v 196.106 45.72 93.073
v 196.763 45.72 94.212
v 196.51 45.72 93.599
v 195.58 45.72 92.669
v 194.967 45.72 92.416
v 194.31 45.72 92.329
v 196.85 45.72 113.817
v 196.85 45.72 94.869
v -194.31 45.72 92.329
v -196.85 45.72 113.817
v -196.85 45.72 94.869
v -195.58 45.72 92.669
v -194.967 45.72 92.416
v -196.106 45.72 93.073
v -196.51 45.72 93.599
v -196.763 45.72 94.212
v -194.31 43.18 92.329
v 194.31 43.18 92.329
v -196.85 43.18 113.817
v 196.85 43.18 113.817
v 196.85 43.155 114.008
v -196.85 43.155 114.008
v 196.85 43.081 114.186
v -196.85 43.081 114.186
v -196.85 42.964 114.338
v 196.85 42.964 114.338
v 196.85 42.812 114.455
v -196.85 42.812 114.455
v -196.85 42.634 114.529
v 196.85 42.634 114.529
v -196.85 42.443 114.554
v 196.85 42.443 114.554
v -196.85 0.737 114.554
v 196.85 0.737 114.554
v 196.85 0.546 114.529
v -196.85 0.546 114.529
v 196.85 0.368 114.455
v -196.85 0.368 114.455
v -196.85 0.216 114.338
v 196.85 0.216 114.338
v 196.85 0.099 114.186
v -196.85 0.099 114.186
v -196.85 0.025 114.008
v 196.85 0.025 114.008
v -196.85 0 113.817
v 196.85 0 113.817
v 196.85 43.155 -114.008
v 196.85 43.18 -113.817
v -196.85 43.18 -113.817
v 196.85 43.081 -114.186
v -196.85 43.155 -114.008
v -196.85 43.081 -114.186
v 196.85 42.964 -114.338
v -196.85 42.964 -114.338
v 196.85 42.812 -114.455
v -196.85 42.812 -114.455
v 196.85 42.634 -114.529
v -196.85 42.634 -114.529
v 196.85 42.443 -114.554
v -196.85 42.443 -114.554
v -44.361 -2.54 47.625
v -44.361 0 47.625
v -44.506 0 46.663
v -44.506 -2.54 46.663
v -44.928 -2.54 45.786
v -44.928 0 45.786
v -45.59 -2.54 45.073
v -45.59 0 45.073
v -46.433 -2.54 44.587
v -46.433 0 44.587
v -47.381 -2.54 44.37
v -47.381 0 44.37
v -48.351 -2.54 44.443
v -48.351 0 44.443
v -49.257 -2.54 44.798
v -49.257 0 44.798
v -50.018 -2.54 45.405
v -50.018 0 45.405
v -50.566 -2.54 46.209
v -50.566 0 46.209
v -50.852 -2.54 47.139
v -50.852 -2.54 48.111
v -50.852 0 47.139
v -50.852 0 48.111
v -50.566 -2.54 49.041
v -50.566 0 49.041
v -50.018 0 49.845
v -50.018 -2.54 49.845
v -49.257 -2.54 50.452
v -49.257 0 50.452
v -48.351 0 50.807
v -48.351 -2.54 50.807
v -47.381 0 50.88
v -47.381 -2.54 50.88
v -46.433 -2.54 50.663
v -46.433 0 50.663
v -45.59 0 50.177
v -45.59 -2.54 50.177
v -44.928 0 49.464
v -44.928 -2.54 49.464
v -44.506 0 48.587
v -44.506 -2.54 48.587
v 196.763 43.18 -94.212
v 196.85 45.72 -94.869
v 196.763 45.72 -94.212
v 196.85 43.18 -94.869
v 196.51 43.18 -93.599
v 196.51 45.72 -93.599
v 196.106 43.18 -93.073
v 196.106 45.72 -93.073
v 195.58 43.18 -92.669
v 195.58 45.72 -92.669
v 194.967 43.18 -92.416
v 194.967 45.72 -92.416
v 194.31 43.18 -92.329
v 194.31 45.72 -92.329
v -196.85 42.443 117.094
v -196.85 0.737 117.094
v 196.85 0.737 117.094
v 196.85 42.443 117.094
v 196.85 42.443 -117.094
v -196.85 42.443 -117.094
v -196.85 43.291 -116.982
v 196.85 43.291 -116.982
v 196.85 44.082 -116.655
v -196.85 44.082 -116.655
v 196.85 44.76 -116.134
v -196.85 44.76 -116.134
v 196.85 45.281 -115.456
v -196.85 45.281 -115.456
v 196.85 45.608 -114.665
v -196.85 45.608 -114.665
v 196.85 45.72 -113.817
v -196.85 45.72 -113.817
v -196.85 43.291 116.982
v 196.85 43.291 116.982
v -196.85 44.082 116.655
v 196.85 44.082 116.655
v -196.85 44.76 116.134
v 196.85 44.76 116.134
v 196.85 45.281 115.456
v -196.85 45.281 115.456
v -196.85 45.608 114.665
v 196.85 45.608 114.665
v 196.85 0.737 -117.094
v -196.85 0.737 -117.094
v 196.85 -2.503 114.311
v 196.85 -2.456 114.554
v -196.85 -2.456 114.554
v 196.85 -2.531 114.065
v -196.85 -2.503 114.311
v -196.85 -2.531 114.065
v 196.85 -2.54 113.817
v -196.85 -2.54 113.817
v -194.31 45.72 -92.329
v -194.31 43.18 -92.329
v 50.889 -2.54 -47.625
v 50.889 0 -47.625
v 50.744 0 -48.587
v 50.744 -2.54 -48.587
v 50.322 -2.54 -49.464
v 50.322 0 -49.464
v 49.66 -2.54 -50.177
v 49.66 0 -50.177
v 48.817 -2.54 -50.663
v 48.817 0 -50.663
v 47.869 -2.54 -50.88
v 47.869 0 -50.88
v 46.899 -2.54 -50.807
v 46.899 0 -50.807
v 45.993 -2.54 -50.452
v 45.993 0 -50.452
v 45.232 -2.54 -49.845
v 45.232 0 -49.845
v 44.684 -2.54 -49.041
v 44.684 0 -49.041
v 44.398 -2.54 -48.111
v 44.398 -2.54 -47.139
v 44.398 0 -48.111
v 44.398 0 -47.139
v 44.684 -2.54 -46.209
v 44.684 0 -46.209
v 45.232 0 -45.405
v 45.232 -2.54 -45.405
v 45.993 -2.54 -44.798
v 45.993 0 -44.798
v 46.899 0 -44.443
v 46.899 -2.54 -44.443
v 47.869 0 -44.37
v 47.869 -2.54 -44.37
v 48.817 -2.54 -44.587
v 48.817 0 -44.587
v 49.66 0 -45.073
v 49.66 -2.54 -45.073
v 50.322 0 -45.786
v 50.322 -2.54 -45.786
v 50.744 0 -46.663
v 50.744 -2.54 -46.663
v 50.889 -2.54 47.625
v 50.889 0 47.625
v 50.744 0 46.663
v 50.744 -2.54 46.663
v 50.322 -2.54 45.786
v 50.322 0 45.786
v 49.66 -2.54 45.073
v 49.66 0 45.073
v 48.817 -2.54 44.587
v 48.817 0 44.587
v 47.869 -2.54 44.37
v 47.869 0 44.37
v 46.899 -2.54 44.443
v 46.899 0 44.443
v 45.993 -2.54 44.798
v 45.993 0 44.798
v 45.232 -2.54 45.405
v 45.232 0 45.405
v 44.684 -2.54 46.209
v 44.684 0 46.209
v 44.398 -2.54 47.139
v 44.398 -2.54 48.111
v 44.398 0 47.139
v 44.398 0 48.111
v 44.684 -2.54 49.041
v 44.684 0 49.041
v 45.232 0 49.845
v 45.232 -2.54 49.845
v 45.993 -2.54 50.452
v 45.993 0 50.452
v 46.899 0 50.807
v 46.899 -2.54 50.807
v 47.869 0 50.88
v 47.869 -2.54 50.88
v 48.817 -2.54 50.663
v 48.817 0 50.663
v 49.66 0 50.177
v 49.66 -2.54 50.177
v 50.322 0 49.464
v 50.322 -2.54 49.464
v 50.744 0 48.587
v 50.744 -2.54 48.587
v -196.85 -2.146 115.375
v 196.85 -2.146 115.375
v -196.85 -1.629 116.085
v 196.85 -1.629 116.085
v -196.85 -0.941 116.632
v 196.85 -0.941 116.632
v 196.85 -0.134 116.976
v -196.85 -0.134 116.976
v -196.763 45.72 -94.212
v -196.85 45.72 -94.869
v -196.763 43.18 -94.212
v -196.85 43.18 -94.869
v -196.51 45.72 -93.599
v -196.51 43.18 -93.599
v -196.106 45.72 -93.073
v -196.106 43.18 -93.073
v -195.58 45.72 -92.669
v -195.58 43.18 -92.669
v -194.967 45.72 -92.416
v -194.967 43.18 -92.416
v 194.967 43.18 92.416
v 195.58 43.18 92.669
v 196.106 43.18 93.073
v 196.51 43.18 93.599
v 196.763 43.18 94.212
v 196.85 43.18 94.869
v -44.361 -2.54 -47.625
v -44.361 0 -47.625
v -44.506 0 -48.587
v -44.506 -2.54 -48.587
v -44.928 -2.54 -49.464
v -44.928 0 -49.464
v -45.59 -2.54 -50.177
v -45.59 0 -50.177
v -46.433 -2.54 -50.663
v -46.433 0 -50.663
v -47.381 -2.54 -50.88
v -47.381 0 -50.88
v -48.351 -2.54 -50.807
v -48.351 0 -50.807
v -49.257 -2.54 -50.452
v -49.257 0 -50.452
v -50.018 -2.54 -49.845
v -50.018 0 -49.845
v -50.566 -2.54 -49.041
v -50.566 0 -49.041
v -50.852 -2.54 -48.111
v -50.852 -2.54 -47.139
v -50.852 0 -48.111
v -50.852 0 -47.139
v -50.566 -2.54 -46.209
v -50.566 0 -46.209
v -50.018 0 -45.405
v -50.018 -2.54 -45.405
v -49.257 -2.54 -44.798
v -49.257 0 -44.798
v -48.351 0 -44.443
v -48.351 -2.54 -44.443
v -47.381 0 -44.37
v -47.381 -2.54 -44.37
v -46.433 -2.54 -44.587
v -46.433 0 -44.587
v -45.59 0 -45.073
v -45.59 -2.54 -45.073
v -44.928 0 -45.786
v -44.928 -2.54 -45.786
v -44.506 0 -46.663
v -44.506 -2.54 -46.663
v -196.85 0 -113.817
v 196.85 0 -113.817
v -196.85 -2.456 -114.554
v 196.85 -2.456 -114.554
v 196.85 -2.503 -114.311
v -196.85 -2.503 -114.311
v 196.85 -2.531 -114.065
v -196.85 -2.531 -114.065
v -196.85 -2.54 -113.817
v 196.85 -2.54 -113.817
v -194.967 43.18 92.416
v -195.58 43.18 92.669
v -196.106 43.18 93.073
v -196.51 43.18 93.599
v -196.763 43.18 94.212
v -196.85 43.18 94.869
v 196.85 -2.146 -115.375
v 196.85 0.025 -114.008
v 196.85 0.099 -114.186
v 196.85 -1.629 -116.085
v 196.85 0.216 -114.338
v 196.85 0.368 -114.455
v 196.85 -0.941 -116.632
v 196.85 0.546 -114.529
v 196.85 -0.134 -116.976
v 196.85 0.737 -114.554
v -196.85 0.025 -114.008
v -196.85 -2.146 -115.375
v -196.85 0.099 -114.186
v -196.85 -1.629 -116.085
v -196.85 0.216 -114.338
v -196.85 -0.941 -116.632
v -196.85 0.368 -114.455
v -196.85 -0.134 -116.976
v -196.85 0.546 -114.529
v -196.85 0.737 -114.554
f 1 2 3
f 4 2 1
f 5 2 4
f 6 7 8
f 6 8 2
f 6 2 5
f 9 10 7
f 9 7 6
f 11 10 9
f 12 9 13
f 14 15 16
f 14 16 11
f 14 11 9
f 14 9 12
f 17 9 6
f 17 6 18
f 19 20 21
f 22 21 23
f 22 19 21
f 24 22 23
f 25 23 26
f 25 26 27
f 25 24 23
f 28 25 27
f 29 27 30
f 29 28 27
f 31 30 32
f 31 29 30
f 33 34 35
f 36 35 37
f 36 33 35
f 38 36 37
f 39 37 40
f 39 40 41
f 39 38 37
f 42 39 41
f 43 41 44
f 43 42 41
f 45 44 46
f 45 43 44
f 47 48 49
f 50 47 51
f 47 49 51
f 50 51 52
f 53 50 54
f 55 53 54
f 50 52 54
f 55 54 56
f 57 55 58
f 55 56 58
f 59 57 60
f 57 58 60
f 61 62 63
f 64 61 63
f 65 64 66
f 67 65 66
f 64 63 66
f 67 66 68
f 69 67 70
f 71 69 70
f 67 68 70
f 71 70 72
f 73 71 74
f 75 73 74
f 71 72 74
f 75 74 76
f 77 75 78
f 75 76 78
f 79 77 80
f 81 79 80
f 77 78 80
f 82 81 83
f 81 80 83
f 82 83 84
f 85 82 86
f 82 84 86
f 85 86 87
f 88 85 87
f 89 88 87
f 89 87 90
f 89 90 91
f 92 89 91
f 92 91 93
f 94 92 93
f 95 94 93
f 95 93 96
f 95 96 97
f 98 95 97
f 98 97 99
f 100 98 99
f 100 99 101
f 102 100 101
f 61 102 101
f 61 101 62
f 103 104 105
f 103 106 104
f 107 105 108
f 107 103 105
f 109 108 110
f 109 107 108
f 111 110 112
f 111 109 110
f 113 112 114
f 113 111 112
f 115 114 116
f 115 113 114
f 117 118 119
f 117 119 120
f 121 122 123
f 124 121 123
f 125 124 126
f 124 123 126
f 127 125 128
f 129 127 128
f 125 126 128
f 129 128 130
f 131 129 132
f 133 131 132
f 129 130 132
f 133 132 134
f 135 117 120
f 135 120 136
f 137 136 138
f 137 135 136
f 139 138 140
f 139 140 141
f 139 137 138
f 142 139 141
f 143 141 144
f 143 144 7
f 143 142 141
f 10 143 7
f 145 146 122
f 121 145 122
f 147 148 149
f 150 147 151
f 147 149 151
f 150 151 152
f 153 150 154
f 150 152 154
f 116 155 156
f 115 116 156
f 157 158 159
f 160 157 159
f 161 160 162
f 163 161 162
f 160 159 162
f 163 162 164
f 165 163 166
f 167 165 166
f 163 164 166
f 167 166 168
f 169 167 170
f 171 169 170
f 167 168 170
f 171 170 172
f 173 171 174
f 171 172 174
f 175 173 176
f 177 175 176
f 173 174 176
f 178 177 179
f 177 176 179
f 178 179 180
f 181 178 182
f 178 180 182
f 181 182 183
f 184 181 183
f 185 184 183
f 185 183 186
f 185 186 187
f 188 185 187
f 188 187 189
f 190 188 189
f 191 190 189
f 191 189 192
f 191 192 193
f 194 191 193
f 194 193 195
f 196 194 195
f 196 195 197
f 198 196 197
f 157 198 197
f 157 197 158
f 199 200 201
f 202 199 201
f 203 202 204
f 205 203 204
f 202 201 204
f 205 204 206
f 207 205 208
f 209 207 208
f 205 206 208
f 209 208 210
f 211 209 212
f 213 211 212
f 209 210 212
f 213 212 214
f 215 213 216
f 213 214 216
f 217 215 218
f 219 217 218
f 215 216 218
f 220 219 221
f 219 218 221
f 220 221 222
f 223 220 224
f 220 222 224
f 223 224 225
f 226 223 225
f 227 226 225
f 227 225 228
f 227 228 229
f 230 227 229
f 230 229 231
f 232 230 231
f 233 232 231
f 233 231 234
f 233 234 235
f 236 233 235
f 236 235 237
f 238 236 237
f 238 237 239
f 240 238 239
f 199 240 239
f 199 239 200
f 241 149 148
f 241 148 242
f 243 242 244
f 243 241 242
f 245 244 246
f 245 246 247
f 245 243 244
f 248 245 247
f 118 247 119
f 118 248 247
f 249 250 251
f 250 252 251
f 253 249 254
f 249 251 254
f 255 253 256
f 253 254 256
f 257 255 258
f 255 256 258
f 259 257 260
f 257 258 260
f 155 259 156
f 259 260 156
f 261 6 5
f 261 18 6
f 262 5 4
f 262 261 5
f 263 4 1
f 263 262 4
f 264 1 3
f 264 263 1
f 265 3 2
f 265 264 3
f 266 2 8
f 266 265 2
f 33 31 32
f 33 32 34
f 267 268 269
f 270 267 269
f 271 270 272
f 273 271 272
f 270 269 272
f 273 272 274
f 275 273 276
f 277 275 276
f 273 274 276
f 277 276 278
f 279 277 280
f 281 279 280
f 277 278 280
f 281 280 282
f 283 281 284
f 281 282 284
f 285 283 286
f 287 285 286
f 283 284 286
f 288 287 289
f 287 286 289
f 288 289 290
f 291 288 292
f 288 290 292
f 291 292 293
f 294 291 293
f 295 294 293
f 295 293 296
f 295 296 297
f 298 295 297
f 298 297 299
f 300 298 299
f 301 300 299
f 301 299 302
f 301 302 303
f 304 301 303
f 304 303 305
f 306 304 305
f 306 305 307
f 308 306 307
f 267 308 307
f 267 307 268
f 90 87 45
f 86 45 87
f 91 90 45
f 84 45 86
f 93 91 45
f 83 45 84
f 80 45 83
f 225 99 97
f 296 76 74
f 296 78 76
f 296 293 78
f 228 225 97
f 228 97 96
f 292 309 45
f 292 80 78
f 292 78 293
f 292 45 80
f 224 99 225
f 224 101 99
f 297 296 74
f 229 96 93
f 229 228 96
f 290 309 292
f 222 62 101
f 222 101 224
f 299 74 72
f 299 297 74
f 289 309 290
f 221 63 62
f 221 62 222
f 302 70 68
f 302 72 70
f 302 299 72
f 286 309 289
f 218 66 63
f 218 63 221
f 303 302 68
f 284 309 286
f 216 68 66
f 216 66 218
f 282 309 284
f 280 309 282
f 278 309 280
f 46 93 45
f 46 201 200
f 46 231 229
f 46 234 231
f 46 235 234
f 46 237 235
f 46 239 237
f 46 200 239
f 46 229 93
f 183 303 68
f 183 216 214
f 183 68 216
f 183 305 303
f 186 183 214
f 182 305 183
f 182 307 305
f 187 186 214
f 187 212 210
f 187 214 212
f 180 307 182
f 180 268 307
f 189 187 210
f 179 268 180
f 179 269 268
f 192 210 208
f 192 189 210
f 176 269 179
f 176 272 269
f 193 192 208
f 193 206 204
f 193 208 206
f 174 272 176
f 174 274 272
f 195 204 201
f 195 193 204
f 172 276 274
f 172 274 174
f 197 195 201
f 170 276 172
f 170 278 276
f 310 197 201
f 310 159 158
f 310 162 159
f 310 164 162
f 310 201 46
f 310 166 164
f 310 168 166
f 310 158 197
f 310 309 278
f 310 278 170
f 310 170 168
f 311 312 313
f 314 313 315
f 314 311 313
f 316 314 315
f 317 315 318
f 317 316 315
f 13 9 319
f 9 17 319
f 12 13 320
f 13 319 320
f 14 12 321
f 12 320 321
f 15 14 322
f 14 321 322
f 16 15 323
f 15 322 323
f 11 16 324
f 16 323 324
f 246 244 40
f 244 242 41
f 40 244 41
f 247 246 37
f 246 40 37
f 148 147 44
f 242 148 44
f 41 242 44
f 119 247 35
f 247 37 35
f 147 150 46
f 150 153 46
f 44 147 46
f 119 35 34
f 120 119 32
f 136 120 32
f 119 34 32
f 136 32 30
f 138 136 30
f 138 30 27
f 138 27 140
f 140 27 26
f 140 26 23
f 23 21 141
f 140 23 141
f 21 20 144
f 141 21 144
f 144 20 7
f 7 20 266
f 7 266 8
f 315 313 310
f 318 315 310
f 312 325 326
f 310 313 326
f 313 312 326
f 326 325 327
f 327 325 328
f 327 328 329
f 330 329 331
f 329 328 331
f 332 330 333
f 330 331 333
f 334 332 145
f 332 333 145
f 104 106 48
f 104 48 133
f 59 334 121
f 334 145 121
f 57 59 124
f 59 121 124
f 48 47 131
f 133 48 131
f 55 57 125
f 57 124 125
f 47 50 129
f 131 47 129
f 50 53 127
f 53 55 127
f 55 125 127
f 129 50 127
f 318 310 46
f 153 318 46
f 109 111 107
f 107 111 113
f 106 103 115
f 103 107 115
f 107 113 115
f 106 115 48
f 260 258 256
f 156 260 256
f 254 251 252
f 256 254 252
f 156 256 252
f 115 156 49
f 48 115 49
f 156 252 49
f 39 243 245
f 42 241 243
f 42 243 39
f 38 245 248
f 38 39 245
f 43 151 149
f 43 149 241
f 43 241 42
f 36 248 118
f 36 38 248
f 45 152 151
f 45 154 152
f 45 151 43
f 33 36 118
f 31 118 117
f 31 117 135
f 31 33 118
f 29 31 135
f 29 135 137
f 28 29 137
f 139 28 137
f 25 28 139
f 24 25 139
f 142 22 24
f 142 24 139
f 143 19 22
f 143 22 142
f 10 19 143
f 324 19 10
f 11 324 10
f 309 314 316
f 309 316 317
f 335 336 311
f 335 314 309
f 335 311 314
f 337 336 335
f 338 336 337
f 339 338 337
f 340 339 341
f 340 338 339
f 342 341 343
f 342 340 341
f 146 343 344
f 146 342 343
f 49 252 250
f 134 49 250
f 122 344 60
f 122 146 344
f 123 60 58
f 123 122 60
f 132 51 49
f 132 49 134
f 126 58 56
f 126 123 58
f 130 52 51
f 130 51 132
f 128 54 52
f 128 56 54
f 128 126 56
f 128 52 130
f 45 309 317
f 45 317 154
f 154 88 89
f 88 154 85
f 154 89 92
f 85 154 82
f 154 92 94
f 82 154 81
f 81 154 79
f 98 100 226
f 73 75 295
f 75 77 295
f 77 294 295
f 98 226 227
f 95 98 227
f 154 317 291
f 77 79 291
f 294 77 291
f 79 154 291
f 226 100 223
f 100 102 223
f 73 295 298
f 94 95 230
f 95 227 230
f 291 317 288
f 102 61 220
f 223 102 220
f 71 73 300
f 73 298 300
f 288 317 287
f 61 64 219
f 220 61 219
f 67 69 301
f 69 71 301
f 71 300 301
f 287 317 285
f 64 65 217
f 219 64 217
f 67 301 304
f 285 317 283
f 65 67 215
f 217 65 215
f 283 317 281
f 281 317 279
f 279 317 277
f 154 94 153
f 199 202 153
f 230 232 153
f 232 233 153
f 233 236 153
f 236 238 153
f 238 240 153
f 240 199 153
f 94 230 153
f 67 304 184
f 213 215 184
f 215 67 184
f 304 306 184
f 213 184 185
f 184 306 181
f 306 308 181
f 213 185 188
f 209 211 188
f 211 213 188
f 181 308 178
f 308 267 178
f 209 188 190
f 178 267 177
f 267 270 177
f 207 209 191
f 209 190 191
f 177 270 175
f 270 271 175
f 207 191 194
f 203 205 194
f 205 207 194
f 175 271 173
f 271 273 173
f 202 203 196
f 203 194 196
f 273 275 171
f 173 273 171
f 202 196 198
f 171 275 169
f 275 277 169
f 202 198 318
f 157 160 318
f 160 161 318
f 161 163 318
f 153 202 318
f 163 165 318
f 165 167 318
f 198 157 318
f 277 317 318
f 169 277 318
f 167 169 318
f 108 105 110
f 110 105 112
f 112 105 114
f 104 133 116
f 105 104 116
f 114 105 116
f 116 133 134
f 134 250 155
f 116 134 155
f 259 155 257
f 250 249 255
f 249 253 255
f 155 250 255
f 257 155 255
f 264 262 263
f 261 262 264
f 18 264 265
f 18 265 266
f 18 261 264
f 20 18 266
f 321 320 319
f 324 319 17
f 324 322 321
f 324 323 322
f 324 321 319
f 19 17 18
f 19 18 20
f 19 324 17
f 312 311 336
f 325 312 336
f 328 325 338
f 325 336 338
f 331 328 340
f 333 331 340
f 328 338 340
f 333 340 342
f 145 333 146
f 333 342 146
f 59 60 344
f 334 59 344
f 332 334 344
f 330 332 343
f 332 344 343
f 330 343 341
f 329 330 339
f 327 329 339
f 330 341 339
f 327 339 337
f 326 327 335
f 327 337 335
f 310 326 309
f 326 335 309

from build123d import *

# Parameters (mm, degrees)
SKETCH1_W               = 393.7
SKETCH1_H               = 229.108
BASE_FLANGE1_DEPTH      = 2.54
MITER_START             = -196.85
MITER_FLANGE1_DEPTH     = 393.7
MITER_FLANGE1_2_DEPTH   = 393.7
FILLET1_R               = 2.54
F_1_4_CLEARANCE_HOLE1_D = 6.5278


# Read off the part's stored shape, not the designer's step: Miter Flange1
# Sheet-metal steps are written as plain solids
with BuildPart() as part:
    # Sketch1 → Base-Flange1 (new body)
    with BuildSketch(Plane(origin=(0, 0, 0), x_dir=(1, 0, 0), z_dir=(0, 1, 0))):
        Rectangle(SKETCH1_W, SKETCH1_H)
    extrude(amount=-BASE_FLANGE1_DEPTH)

    # Miter Flange1 outline → Miter Flange1 (cut)
    with BuildSketch(Plane.YZ.offset(MITER_START)):
        with BuildLine():
            Line((-2.54, -114.554), (-2.456130493, -114.554))
            ThreePointArc((-2.456130493, -114.554), (-2.518965104, -114.188079664), (-2.54, -113.8174))
            Line((-2.54, -113.8174), (-2.54, -114.554))
        make_face()
    miter_flange1 = extrude(amount=MITER_FLANGE1_DEPTH, mode=Mode.SUBTRACT)

    # Miter Flange1 2 outline → Miter Flange1 2 (add)
    with BuildSketch(Plane.YZ.offset(MITER_START)):
        with BuildLine():
            Line((45.72, -113.8174), (45.72, -92.329))
            Line((45.72, -92.329), (43.18, -92.329))
            Line((43.18, -92.329), (43.18, -113.8174))
            ThreePointArc((43.18, -113.8174), (42.964254855, -114.338254855), (42.4434, -114.554))
            Line((42.4434, -114.554), (0.7366, -114.554))
            ThreePointArc((0.7366, -114.554), (0.215745145, -114.338254855), (0, -113.8174))
            Line((0, -113.8174), (0, -114.554))
            Line((0, -114.554), (-2.456130493, -114.554))
            ThreePointArc((-2.456130493, -114.554), (-1.303322057, -116.381542266), (0.7366, -117.094))
            Line((0.7366, -117.094), (42.4434, -117.094))
            ThreePointArc((42.4434, -117.094), (44.760306079, -116.134306079), (45.72, -113.8174))
        make_face()
    miter_flange1_2 = extrude(amount=MITER_FLANGE1_2_DEPTH)

    # Mirror1: Miter Flange1, Miter Flange1 2 across plane
    add(miter_flange1.mirror(Plane.XY), mode=Mode.SUBTRACT)
    add(miter_flange1_2.mirror(Plane.XY))

    # Fillet1
    fillet1_edges = [part.edges().sort_by_distance(p)[0] for p in [
        (-196.85, 44.45, -92.329),
        (196.85, 44.45, -92.329),
        (-196.85, 44.45, 92.329),
        (196.85, 44.45, 92.329),
    ]]
    fillet(fillet1_edges, radius=FILLET1_R)

    # 1/4 Clearance Hole1 (through all)
    with Locations(Plane(origin=(0, -2.54, 0), x_dir=(-1, 0, 0), z_dir=(0, -1, 0))):
        with Locations((-47.625, -47.625), (-47.625, 47.625), (47.625, 47.625), (47.625, -47.625)):
            Hole(F_1_4_CLEARANCE_HOLE1_D / 2)


solid = part.part
